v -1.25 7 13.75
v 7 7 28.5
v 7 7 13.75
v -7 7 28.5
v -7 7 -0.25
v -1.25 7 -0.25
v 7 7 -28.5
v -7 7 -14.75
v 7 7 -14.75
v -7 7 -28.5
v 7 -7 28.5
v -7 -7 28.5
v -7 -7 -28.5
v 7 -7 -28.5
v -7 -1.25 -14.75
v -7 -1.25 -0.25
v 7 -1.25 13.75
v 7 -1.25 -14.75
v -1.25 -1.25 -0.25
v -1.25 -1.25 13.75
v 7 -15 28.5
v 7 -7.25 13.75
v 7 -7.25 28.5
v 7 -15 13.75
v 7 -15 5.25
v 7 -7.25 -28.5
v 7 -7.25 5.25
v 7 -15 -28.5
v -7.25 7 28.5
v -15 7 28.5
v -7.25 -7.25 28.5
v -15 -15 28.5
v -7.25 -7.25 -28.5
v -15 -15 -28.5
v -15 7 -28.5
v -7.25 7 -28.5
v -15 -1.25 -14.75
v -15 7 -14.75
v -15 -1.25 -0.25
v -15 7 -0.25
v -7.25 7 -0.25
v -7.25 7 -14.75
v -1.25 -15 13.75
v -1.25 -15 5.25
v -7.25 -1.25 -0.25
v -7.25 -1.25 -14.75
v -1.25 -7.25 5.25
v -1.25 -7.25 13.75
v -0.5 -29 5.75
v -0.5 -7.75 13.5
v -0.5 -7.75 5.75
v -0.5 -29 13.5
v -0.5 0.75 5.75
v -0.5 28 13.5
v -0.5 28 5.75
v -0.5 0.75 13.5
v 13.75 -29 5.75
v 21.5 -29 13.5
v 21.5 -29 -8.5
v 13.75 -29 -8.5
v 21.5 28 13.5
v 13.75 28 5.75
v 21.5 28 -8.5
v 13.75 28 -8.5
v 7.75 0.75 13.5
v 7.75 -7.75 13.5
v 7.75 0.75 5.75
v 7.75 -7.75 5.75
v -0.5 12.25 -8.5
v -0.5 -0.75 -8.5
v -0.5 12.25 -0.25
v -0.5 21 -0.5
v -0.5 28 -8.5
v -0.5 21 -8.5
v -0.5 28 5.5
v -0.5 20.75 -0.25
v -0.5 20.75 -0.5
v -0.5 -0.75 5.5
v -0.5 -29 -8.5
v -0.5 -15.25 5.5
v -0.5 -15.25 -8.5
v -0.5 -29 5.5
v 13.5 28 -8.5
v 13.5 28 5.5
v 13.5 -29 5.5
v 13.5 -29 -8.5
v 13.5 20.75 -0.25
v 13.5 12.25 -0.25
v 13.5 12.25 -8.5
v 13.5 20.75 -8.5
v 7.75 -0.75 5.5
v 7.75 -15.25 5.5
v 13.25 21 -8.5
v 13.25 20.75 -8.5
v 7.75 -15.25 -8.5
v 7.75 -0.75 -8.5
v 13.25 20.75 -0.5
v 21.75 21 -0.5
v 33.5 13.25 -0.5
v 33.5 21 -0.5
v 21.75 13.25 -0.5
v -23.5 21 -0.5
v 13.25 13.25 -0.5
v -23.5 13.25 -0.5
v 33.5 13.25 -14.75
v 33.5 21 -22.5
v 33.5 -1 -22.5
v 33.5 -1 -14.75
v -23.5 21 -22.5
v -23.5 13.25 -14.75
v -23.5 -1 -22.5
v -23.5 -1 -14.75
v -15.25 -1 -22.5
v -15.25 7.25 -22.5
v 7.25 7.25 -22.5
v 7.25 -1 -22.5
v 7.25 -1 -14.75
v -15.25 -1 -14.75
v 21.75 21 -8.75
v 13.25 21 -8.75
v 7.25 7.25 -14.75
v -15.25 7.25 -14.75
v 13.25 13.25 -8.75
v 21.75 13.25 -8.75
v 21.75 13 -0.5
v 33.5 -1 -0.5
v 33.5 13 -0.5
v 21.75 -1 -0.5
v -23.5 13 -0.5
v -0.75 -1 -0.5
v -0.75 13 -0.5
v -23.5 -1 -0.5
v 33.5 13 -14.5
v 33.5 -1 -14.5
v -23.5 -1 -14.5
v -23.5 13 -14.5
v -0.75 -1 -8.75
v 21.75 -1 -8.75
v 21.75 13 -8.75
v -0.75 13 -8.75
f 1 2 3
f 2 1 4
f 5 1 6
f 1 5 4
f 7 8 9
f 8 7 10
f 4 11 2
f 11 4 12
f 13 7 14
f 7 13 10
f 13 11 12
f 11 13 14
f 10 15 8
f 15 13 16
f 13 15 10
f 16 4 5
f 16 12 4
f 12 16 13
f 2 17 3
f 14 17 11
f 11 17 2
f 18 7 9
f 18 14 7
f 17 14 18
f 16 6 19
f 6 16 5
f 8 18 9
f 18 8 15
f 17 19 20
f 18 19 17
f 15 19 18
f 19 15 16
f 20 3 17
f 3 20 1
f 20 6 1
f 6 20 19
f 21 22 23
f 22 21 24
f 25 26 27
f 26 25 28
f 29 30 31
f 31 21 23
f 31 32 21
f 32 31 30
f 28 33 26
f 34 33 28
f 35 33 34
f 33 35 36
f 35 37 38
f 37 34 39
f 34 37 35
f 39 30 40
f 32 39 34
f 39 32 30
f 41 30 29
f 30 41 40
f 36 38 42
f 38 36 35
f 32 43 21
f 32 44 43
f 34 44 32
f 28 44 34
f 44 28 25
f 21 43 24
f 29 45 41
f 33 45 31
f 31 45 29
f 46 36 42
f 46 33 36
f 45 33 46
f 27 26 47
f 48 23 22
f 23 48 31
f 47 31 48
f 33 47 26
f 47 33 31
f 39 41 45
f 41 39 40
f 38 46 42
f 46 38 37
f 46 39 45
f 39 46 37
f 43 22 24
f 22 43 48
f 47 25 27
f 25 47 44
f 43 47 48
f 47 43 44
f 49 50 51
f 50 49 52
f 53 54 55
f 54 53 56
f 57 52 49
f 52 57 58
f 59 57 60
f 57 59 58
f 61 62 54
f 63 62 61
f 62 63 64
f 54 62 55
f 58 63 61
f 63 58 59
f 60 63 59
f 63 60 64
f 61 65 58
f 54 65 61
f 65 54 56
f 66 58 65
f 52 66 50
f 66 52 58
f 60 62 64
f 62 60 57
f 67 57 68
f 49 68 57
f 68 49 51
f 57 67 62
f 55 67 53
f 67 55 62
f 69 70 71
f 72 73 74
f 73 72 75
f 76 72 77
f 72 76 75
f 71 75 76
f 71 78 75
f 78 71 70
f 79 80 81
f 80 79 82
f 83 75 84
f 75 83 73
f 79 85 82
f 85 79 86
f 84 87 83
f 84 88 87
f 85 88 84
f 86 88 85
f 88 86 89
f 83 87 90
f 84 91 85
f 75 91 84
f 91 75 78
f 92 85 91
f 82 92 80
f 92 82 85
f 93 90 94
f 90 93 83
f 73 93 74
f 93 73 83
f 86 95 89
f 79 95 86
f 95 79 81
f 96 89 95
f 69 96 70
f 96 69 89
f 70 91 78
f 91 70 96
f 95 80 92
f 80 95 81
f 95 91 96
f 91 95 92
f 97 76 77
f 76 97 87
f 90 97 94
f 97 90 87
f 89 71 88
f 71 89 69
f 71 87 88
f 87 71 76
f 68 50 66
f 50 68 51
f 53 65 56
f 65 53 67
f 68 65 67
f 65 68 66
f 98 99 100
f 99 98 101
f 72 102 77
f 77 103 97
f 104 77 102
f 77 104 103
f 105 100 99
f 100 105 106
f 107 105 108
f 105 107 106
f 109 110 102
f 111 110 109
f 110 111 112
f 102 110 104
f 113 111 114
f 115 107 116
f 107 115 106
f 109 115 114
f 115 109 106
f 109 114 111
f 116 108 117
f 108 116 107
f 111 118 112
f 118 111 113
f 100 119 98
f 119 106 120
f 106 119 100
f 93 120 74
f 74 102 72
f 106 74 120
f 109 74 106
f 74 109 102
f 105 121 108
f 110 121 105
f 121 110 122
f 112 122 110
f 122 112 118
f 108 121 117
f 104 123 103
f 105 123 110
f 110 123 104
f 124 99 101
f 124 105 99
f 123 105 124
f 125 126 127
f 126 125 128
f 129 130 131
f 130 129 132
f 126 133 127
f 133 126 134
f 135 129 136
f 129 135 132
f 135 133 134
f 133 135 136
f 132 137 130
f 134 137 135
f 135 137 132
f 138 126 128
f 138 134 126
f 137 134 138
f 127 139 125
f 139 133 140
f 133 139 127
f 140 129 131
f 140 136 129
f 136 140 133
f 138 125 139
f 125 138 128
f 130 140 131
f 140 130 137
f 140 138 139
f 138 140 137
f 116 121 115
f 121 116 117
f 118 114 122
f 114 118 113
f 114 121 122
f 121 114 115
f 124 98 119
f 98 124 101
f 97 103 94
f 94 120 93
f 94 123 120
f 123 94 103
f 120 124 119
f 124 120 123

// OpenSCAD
h=57;
t=6;
s=14;
g=0.5;

module inside(a=0) {
    cube([s+a,s+a,h+a], center=true);
}
module outside() {
    difference() {
        translate([-(s-t)/2,-(s-t)/2,0])
        cube([s+(s-t),s+(s-t),h], center=true);
        scale([2,2,1])
        translate([s/4+g/4,s/4+g/4,0])
        inside(g);
    }
}

module cuts() {
    cube([s+g,s+g,s+g], center=true);
}

module cutt(xs) {
    cube([xs[0]+g,xs[1]+g,xs[2]+g], center=true);
}

module inside1() {
    difference() {
        inside();
        translate([t,0,-h/2+s/2+s])
        cuts();
        translate([t,-t,-h/2+s/2+s*2])
        cuts();
    }
}

module inside2() {
    difference() {
        inside();
        translate([t,0,-h/2+s/2+s])
        cuts();
        translate([0,-t,h/2-(s-t)/2-(s-t)+g])
        cutt([s,s,s-t]);
    }
}

module inside3() {
    difference() {
        inside();
        translate([t,0,h/2-(s+s-t)/2-t*2])
        cube([s+g,s+g,s+(s-t)+g], center=true);
    }
}

module outside1() {
    difference() {
        outside();
        translate([-(s-t),t,-h/2+s/2+s])
        cuts();
        translate([t,-(s-t),-h/2+(s-t)/2+s*3-(s-t)])
        cutt([s,s,s-t]);
    }
}

module outside2() {
    difference() {
        outside();
        translate([t,-(s-t),h/2-(s-t)/2-s-(s-t)+g])
        cutt([s,s,s-t]);
    }
}

module outside3() {
    difference() {
        outside();
        translate([-(s-t),t,-h/2+(s+s-t)/2+(s-t)+g])
        cutt([s,s,s+s-t]);
        translate([t,-(s-t),h/2-(s-t)/2-t*2])
        cutt([s,s,s-t]);
    }
}

module part1() {
    rotate([0,0,90])
    inside1();
    outside1();
}

module part2() {
    rotate([180, 0,0])
    inside2();
    outside2();
}

module part3() {
    inside3();
    outside3();
}

part1();
rotate([0,0,180])
rotate([-90,0,0])
translate([-t-g,1+g,g])
part2();
rotate([0,90,0])
rotate([0,0,180])
translate([-t-g*3,-t,t-g*2])
part3();
